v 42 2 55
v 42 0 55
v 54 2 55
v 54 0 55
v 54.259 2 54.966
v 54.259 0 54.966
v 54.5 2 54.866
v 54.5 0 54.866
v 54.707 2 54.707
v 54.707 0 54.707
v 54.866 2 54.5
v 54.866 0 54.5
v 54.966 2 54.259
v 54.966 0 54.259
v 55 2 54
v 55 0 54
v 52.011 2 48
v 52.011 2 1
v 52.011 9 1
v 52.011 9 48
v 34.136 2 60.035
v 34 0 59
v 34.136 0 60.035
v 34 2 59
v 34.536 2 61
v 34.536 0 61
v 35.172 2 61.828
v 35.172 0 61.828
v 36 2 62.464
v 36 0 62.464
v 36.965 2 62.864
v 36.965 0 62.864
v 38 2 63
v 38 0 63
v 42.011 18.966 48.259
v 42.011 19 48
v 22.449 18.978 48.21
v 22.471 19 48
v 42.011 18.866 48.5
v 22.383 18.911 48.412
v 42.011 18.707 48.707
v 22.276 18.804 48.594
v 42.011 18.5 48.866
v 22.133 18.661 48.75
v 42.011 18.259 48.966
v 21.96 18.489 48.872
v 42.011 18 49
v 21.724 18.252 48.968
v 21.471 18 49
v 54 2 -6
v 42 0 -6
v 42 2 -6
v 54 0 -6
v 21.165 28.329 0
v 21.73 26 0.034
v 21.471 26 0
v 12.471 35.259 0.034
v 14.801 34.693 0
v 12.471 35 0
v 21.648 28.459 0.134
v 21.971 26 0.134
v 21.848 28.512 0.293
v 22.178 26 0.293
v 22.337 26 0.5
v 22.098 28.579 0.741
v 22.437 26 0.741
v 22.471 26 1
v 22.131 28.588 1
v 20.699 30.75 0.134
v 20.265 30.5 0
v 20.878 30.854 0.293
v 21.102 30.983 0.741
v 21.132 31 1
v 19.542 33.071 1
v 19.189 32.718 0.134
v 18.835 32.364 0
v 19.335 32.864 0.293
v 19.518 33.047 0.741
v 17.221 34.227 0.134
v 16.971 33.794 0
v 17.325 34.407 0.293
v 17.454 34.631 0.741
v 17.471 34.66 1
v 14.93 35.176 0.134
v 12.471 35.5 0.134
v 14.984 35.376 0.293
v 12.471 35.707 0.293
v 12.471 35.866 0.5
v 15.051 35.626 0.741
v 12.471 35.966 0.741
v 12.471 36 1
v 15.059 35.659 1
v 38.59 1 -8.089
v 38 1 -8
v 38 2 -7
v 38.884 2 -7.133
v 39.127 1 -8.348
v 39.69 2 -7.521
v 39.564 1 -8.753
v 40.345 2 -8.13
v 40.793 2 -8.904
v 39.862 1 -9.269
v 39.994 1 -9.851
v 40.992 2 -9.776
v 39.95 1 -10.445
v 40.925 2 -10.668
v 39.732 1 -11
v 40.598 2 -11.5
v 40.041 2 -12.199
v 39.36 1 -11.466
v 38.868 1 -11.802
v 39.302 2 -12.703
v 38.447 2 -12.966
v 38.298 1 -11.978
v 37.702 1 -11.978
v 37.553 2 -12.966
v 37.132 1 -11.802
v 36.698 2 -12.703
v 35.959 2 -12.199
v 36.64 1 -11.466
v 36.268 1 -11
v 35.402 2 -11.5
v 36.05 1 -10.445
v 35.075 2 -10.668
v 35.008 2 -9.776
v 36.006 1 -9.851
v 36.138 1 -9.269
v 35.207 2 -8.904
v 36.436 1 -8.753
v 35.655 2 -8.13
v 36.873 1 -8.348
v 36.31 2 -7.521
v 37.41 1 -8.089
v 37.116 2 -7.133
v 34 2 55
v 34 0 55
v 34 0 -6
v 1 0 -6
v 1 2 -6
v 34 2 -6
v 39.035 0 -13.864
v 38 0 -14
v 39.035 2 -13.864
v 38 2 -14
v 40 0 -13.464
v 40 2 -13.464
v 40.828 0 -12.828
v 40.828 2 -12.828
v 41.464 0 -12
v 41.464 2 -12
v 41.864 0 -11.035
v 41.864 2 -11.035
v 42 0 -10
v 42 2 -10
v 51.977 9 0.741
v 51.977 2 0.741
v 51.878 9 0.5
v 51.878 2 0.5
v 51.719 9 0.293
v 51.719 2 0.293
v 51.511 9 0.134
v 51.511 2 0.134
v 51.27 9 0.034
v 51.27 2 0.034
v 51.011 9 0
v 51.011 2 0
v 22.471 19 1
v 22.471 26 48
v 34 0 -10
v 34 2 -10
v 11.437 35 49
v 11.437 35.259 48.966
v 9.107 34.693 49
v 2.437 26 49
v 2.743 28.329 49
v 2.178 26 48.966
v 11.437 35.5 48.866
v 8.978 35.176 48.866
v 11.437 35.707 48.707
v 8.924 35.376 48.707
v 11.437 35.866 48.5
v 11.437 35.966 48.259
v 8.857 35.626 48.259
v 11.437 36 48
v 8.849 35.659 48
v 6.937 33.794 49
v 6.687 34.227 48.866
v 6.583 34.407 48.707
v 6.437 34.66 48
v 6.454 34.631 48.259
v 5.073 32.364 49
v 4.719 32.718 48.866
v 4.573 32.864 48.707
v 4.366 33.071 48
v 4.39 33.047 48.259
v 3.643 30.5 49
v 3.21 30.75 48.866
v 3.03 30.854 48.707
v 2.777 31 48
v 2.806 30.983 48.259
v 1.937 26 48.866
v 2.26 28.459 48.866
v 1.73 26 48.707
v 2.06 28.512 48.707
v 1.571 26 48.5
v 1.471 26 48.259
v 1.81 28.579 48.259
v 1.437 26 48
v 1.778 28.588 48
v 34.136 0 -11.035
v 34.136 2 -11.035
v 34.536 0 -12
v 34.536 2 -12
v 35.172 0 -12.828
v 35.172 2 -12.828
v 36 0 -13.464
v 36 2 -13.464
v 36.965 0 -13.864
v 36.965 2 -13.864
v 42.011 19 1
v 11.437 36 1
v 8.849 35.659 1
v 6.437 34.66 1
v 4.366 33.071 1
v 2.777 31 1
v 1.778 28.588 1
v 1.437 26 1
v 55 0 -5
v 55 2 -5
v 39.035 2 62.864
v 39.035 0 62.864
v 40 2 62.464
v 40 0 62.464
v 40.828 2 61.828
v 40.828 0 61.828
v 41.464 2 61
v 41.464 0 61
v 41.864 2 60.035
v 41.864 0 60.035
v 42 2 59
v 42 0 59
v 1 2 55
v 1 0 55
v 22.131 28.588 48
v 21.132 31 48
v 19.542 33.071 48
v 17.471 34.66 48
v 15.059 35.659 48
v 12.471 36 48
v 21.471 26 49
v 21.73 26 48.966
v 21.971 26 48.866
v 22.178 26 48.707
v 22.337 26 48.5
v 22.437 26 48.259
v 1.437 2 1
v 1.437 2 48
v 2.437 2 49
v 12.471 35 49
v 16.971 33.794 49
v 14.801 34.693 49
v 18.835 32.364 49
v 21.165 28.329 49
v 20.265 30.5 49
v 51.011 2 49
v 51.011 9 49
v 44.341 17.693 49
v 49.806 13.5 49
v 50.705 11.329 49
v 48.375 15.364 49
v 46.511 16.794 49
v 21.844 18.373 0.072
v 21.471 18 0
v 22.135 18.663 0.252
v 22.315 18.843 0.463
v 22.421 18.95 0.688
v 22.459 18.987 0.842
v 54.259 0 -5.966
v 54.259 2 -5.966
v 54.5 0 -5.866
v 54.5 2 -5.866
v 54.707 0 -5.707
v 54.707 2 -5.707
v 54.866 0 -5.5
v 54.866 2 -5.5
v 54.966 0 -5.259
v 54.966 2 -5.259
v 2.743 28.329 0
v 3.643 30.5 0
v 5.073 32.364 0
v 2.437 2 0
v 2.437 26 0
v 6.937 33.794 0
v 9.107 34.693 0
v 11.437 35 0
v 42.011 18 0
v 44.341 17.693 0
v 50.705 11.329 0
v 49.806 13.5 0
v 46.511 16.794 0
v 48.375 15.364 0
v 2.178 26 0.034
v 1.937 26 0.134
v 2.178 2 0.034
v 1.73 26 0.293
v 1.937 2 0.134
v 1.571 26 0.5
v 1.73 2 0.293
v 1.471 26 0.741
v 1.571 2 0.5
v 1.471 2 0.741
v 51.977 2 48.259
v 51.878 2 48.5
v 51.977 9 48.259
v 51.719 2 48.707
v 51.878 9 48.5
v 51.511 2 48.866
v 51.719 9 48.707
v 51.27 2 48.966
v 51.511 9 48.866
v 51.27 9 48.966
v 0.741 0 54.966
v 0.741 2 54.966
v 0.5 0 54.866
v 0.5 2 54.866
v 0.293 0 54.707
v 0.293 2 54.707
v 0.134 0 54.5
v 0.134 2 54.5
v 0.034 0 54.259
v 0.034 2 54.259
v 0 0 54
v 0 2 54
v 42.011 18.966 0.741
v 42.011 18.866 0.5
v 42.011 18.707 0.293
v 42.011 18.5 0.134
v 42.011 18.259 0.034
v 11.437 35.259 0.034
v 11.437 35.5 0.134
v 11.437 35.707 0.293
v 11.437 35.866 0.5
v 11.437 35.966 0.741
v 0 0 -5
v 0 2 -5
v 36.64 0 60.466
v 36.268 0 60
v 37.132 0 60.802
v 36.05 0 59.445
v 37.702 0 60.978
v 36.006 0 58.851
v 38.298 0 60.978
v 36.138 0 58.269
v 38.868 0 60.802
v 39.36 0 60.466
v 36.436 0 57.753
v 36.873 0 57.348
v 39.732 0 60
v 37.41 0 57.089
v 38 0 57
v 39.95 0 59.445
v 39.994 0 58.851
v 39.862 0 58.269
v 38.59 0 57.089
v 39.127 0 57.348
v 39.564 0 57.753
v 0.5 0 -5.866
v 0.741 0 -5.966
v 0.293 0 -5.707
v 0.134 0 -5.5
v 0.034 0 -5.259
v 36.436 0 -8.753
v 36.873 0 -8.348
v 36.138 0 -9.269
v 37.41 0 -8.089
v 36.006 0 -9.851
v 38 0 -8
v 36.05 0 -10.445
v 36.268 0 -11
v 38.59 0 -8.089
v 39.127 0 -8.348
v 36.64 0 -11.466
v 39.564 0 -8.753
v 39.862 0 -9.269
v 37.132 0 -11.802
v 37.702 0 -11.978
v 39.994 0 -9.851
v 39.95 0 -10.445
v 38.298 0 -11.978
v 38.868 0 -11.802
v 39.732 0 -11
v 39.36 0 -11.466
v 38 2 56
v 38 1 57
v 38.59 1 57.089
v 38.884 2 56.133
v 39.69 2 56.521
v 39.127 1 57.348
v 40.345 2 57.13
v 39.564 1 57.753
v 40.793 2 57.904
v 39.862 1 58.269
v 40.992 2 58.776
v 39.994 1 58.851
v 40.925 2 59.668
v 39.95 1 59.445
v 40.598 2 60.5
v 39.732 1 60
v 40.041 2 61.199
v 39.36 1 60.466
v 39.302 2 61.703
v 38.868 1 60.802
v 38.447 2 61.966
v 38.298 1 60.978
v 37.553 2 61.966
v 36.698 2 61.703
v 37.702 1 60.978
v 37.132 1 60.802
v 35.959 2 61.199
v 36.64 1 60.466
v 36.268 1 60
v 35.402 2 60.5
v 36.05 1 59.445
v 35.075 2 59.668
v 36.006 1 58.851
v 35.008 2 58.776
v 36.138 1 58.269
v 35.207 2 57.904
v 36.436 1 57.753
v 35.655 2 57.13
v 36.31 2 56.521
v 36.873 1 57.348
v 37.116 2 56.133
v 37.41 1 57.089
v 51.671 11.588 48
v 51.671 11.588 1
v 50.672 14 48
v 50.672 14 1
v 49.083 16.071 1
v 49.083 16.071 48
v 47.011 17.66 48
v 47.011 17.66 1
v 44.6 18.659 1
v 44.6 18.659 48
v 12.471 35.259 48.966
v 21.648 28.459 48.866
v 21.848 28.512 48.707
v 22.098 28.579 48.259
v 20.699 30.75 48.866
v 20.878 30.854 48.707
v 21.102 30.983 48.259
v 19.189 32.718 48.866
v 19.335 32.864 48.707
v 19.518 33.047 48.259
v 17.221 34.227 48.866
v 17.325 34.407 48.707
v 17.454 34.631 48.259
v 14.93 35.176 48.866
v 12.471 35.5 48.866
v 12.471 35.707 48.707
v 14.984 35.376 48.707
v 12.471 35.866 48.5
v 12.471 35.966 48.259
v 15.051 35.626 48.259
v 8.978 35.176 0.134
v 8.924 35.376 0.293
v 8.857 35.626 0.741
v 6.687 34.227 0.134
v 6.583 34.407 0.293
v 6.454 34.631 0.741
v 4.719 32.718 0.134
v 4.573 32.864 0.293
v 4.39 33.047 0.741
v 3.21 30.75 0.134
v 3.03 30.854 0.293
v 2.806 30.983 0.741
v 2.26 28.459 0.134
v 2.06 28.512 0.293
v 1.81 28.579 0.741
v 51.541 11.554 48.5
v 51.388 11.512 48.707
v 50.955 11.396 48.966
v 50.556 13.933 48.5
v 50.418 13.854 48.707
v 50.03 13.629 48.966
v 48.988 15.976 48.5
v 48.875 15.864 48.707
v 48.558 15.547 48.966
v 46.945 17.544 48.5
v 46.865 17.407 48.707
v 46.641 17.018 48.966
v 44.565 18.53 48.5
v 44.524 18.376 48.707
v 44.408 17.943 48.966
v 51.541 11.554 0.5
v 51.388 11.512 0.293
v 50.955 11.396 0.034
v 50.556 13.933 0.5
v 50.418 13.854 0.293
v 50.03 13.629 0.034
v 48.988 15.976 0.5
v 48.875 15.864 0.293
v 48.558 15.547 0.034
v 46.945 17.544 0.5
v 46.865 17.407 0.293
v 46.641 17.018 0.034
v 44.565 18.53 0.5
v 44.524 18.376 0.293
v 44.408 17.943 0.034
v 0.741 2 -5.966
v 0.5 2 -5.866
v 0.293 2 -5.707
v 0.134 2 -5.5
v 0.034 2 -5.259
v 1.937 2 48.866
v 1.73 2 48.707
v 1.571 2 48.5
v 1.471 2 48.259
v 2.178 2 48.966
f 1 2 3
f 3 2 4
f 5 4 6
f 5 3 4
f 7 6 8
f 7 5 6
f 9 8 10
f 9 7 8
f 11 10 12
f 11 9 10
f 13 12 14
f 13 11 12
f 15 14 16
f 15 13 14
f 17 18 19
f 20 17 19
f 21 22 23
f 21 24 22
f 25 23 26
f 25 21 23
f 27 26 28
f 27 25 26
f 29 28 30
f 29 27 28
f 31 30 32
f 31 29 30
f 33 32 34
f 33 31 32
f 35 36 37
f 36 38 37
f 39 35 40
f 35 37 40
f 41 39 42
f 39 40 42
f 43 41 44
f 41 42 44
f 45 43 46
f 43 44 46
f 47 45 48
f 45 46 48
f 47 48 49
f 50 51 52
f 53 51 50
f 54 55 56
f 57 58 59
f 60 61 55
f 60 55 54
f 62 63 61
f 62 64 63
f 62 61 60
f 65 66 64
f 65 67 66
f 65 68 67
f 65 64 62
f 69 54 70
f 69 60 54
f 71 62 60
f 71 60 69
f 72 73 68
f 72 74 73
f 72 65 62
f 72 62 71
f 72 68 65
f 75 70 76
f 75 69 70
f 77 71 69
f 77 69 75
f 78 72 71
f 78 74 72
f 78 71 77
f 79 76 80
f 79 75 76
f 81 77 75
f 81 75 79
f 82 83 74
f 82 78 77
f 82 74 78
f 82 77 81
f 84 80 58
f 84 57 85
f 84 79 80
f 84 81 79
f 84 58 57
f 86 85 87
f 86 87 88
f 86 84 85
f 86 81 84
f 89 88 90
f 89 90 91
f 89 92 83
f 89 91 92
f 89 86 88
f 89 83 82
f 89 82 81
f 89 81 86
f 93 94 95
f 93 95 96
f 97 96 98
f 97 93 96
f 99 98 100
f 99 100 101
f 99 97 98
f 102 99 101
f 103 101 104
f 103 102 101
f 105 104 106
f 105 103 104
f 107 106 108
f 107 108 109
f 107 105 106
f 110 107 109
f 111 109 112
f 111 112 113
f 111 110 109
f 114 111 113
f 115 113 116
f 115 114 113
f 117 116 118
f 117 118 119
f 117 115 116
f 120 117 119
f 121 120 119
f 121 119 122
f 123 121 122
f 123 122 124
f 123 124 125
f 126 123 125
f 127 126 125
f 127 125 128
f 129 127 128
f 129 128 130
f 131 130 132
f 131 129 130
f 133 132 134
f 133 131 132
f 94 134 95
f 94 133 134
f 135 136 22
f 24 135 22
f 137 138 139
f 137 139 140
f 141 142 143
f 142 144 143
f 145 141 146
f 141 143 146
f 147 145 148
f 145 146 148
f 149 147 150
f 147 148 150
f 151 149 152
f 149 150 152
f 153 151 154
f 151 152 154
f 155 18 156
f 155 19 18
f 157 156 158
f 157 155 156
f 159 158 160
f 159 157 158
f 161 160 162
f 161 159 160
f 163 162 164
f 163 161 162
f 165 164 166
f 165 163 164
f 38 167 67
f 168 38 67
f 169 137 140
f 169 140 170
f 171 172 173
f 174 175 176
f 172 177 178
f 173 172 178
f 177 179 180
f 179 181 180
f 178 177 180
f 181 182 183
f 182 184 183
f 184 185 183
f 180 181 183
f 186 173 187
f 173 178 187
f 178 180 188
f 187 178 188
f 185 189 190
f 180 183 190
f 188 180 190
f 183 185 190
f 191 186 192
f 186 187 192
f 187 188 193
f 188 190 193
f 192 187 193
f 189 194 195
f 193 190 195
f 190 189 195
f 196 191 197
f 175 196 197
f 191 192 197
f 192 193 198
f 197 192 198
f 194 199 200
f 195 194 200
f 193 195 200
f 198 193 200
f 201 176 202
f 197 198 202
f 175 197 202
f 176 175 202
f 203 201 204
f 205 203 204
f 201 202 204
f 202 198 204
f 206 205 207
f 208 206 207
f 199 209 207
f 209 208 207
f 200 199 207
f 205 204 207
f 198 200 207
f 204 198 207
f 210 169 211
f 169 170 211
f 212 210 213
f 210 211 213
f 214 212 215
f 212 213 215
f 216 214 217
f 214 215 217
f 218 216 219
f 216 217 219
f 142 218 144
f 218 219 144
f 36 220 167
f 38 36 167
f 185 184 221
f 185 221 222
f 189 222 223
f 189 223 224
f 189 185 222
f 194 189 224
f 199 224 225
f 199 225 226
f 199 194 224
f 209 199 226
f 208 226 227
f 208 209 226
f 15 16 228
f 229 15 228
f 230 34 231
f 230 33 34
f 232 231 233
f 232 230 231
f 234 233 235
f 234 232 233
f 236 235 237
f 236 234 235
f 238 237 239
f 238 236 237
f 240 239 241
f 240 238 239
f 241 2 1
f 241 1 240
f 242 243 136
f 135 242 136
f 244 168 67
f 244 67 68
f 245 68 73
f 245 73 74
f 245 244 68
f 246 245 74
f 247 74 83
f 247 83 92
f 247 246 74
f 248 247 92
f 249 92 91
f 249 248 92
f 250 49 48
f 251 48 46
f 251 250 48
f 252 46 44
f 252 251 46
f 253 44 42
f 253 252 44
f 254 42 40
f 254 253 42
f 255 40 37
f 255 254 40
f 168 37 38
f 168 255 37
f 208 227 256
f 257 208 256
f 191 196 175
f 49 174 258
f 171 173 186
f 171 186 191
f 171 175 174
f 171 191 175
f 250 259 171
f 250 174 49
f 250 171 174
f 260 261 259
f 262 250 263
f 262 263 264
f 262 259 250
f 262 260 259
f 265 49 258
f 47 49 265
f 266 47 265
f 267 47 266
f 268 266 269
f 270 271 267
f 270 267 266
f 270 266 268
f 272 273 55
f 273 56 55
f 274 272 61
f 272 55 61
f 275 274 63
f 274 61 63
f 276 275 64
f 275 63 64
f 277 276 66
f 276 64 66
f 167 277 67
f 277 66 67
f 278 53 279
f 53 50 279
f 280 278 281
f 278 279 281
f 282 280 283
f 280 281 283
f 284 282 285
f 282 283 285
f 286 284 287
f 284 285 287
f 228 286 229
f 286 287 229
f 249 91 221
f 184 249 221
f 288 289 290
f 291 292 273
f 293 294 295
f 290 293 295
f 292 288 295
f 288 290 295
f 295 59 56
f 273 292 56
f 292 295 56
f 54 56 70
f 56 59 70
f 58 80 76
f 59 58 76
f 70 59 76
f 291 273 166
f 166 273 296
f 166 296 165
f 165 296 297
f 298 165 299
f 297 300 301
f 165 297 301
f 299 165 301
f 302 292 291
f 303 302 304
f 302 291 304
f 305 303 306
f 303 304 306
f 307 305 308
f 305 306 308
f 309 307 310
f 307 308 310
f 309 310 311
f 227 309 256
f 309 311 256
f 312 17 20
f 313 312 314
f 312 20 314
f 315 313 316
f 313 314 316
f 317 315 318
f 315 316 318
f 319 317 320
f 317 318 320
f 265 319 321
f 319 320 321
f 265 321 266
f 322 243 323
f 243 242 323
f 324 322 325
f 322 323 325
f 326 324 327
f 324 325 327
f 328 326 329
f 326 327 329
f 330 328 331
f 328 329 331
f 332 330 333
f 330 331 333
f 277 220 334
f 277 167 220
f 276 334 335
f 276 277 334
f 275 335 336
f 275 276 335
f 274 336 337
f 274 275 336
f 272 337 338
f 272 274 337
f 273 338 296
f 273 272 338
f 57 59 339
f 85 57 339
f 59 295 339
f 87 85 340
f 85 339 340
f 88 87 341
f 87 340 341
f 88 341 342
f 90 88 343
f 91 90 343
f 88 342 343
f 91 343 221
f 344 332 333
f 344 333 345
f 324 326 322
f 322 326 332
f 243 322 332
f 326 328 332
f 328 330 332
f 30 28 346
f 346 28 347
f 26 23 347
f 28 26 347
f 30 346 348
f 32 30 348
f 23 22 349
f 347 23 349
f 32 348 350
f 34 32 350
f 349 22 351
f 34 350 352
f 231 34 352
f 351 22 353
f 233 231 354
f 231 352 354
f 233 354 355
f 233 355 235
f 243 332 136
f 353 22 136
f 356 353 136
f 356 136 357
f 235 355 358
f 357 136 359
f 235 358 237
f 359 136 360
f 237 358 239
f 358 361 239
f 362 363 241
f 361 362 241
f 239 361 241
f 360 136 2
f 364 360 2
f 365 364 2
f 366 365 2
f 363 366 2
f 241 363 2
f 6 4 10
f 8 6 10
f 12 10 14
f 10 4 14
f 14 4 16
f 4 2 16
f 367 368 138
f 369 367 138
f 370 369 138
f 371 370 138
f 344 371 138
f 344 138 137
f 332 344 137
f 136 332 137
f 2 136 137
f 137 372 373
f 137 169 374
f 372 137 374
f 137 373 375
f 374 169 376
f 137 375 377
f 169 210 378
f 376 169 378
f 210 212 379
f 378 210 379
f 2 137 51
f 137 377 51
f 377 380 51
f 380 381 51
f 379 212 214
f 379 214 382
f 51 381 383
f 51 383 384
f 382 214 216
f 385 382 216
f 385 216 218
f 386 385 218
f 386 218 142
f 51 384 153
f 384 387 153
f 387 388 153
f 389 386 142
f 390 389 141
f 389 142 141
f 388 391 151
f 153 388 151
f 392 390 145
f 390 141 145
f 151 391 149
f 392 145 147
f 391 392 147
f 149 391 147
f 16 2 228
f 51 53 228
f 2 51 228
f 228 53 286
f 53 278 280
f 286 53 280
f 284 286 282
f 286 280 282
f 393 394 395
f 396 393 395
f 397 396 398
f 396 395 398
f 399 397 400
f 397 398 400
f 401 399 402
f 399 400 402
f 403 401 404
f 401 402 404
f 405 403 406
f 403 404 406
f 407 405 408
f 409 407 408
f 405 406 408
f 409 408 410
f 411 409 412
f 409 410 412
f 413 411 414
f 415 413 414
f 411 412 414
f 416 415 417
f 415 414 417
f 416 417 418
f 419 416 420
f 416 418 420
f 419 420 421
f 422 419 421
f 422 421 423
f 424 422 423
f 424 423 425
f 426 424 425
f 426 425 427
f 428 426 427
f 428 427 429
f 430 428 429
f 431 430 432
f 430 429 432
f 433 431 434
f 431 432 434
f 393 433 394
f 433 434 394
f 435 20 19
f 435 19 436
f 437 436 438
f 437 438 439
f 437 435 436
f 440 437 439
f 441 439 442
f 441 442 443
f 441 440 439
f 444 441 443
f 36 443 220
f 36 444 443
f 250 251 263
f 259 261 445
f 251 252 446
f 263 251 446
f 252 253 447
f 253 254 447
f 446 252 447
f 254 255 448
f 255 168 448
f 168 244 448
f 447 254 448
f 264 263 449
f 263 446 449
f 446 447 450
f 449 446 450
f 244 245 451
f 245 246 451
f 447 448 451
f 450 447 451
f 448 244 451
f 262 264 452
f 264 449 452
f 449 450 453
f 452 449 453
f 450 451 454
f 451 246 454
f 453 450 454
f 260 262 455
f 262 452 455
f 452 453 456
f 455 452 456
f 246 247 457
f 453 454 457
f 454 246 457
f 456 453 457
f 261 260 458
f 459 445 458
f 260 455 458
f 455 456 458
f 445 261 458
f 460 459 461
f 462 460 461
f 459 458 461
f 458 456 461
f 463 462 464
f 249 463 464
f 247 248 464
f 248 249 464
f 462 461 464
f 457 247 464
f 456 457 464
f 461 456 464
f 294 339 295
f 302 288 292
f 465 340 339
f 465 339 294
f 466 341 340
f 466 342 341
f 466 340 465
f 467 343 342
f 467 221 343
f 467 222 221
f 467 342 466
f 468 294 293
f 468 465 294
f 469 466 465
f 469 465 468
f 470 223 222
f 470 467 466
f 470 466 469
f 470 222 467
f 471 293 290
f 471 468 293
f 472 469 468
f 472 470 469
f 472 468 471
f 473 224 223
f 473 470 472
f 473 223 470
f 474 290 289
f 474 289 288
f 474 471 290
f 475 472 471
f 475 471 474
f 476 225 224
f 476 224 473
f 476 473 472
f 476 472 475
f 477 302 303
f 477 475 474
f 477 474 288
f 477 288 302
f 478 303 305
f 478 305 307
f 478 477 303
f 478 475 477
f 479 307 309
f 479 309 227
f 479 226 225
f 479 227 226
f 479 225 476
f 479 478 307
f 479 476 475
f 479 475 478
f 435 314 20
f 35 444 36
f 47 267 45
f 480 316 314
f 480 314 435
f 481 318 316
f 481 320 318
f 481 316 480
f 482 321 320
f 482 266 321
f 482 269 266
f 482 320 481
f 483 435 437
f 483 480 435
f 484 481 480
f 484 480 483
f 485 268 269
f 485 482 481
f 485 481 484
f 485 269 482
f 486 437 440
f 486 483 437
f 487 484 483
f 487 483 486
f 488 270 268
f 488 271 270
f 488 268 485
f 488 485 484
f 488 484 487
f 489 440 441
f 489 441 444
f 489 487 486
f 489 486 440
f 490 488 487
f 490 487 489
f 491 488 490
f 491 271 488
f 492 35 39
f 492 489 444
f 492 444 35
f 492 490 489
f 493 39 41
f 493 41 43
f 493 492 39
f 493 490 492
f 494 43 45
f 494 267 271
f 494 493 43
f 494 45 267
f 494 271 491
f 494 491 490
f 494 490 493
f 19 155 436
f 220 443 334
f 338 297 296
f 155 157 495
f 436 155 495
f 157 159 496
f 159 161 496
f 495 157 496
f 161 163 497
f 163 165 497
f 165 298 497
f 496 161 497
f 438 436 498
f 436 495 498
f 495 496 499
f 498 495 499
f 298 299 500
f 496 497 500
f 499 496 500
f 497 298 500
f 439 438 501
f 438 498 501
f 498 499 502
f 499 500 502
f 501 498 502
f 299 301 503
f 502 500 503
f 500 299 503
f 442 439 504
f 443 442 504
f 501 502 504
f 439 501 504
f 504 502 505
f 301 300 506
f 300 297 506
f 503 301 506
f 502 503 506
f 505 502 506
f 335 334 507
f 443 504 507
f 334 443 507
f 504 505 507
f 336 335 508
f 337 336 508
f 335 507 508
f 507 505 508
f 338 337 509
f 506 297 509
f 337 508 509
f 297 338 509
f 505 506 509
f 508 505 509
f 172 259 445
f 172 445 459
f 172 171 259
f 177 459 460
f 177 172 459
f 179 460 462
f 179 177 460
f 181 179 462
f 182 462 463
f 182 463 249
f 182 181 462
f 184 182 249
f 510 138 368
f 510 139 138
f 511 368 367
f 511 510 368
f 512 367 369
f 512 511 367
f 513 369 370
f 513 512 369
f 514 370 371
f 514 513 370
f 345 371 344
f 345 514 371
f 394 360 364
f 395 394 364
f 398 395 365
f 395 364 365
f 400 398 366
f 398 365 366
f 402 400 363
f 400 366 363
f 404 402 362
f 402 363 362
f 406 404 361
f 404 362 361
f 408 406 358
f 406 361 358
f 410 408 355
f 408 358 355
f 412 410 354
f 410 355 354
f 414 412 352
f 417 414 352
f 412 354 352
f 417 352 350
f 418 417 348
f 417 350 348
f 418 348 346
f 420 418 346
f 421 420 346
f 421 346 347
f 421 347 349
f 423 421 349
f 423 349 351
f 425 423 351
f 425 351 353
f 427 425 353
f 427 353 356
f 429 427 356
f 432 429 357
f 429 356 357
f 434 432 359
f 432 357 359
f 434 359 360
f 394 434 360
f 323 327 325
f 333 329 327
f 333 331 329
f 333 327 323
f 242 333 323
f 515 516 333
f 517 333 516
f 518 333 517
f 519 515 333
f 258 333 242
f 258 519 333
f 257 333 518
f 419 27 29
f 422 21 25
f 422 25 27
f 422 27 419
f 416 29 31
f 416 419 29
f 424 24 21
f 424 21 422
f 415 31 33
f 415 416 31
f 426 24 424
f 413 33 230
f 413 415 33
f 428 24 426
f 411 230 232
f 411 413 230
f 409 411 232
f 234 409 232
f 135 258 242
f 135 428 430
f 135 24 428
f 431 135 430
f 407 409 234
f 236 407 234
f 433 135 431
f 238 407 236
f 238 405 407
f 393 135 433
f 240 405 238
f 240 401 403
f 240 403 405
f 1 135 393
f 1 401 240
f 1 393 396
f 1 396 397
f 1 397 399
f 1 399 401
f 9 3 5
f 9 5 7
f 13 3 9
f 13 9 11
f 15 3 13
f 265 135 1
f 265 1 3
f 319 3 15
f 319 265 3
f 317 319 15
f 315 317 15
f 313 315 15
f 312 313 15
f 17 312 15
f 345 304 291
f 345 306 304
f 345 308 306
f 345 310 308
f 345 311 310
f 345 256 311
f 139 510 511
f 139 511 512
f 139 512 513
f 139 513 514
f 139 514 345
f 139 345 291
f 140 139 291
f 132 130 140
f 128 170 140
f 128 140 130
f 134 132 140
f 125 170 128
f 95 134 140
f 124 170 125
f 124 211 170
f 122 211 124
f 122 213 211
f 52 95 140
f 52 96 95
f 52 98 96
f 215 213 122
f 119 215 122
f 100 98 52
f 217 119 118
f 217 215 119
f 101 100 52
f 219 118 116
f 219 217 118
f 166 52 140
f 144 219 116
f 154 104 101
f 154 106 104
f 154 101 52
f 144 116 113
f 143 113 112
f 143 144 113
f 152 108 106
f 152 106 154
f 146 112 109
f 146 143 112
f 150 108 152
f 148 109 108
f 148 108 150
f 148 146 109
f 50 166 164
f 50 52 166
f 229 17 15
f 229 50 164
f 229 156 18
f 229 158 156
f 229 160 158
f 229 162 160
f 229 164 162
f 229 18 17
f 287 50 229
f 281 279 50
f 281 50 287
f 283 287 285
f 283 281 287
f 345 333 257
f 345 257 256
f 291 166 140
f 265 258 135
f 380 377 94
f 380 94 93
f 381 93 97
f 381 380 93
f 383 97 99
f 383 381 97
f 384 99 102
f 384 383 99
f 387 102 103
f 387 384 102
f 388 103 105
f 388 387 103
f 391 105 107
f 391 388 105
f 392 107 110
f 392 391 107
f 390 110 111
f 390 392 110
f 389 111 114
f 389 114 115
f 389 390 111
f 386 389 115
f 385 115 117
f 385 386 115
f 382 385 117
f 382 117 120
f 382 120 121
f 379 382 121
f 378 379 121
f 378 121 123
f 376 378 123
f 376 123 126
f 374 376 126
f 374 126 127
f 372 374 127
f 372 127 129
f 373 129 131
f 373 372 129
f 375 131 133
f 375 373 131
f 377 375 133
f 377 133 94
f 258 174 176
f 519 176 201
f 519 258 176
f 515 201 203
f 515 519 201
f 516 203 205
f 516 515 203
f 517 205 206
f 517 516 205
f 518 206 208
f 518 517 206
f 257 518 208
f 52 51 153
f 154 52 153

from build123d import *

# Parameters (mm, degrees)
BOSS_EXTRUDE1_DEPTH = 49
FILLET1_R           = 10
FILLET2_R           = 1
SKETCH2_W           = 55
SKETCH2_H           = 6
SKETCH2_W_2         = 8
SKETCH2_H_2         = 8
SKETCH2_R           = 2
BOSS_EXTRUDE2_DEPTH = 2
FILLET3_R           = 4
FILLET4_R           = 1
CHAMFER1_SIZE       = 1


with BuildPart() as part:
    # Sketch1 → Boss-Extrude1 (new body)
    with BuildSketch(Plane.XY):
        Polygon((0, 0), (55, 0), (55, 2), (52.011494253, 2), (52.011494253, 19), (22.471264368, 19), (22.471264368, 36), (1.436781609, 36), (1.436781609, 2), (0, 2), align=None)
    extrude(amount=BOSS_EXTRUDE1_DEPTH)

    # Fillet1
    fillet1_edges = [part.edges().sort_by_distance(p)[0] for p in [
        (1.436781609, 36, 24.5),
        (22.471264368, 36, 24.5),
        (52.011494253, 19, 24.5),
    ]]
    fillet(fillet1_edges, radius=FILLET1_R)

    # Fillet2
    fillet2_edges = [part.edges().sort_by_distance(p)[0] for p in [
        (22.471264368, 22.5, 0),
        (52.011494253, 5.5, 0),
        (52.011494253, 5.5, 49),
        (22.471264368, 22.5, 49),
        (32.24137931, 19, 0),
        (32.24137931, 19, 49),
        (1.436781609, 14, 0),
        (11.954022989, 36, 0),
        (19.54233218, 33.071067812, 0),
        (4.365713797, 33.071067812, 0),
        (49.082562065, 16.071067812, 0),
        (11.954022989, 36, 49),
        (1.436781609, 14, 49),
        (19.54233218, 33.071067812, 49),
        (4.365713797, 33.071067812, 49),
        (49.082562065, 16.071067812, 49),
    ]]
    fillet(fillet2_edges, radius=FILLET2_R)

    # Sketch2 → Boss-Extrude2 (add)
    # profile 1 of 2: a face of its own
    with BuildSketch(Plane.XZ):
        with Locations((27.5, 52)):
            Rectangle(SKETCH2_W, SKETCH2_H)
    # profile 2 of 2: a face of its own
    with BuildSketch(Plane.XZ):
        with Locations((38, 59)):
            Rectangle(SKETCH2_W_2, SKETCH2_H_2)
        with Locations(Location((38, 59, 0), (0, 0, 270))):
            Circle(SKETCH2_R, mode=Mode.SUBTRACT)
    extrude(amount=-BOSS_EXTRUDE2_DEPTH)

    # Fillet3
    fillet3_edges = [part.edges().sort_by_distance(p)[0] for p in [
        (34, 1, 63),
        (42, 1, 63),
    ]]
    fillet(fillet3_edges, radius=FILLET3_R - 0.0001)  # a hair under: the kernel refuses the full size

    # Fillet4
    fillet4_edges = [part.edges().sort_by_distance(p)[0] for p in [
        (0, 1, 55),
        (55, 1, 55),
    ]]
    fillet(fillet4_edges, radius=FILLET4_R)

    # Mirror7: part across plane


with BuildPart() as part_1:
    add(part.part)
    add(part.part.mirror(Plane.XY.offset(24.5)))

    # Chamfer1
    chamfer1_edges = [part_1.edges().sort_by_distance(p)[0] for p in [
        (38, 2, 61),
        (38, 2, -12),
    ]]
    chamfer(chamfer1_edges, length=CHAMFER1_SIZE)


solid = part_1.part
